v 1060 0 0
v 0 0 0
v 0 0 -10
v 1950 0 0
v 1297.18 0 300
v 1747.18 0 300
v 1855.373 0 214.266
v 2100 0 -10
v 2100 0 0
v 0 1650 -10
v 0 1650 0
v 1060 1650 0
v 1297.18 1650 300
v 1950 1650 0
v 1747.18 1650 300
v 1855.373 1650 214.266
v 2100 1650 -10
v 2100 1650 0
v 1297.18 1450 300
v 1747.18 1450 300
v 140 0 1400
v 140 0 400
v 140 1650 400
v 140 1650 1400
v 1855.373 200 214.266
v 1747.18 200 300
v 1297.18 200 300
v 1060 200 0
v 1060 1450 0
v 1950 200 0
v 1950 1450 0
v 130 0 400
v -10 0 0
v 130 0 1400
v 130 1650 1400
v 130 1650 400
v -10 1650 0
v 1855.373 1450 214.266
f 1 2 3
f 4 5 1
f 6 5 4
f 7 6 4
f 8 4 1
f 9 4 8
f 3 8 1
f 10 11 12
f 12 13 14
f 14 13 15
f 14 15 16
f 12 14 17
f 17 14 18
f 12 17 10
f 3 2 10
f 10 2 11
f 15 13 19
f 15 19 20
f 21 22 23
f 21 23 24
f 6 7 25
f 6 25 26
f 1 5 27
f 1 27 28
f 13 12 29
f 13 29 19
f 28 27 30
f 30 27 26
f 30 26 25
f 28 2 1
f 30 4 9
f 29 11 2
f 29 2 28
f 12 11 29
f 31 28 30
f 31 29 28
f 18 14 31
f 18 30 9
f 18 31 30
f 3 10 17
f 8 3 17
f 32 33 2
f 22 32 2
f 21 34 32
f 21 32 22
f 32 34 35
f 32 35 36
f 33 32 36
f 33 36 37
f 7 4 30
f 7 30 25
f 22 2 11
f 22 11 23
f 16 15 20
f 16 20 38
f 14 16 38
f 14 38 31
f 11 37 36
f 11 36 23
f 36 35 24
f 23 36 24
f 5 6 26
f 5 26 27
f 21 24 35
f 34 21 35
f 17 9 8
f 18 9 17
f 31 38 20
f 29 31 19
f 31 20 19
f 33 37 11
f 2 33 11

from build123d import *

# Parameters (mm, degrees)
F0_W     = 2100
F0_H     = 1650
F2_DEPTH = 10
F3_DEPTH = 1650
F5_DEPTH = 200
F7_DEPTH = 200


with BuildPart() as f2:
    # F0 (on Top) → F2 (new body)
    with BuildSketch(Plane.XY):
        with Locations((1050, 825)):
            Rectangle(F0_W, F0_H)
    extrude(amount=-F2_DEPTH)

    # F4 (on face) → F5 (join)
    with BuildSketch(Plane.XZ):
        Polygon((1060, 0), (1950, 0), (1855.373144, 214.266241), (1747.180414, 300), (1297.180414, 300), align=None)
    extrude(amount=-F5_DEPTH)

    # F6 (on face) → F7 (join)
    with BuildSketch(Plane(origin=(0, 1650, 0), x_dir=(-1, 0, 0), z_dir=(0, 1, 0))):
        Polygon((-1855.373144, 214.266241), (-1950, 0), (-1060, 0), (-1297.180414, 300), (-1747.180414, 300), align=None)
    extrude(amount=-F7_DEPTH)


with BuildPart() as f3:
    # F1 (on Front) → F3 (new body)
    with BuildSketch(Plane.XZ):
        Polygon((-10, 0), (0, 0), (140, 400), (140, 1400), (130, 1400), (130, 400), align=None)
    extrude(amount=-F3_DEPTH)


solid = Compound([f2.part, f3.part])
